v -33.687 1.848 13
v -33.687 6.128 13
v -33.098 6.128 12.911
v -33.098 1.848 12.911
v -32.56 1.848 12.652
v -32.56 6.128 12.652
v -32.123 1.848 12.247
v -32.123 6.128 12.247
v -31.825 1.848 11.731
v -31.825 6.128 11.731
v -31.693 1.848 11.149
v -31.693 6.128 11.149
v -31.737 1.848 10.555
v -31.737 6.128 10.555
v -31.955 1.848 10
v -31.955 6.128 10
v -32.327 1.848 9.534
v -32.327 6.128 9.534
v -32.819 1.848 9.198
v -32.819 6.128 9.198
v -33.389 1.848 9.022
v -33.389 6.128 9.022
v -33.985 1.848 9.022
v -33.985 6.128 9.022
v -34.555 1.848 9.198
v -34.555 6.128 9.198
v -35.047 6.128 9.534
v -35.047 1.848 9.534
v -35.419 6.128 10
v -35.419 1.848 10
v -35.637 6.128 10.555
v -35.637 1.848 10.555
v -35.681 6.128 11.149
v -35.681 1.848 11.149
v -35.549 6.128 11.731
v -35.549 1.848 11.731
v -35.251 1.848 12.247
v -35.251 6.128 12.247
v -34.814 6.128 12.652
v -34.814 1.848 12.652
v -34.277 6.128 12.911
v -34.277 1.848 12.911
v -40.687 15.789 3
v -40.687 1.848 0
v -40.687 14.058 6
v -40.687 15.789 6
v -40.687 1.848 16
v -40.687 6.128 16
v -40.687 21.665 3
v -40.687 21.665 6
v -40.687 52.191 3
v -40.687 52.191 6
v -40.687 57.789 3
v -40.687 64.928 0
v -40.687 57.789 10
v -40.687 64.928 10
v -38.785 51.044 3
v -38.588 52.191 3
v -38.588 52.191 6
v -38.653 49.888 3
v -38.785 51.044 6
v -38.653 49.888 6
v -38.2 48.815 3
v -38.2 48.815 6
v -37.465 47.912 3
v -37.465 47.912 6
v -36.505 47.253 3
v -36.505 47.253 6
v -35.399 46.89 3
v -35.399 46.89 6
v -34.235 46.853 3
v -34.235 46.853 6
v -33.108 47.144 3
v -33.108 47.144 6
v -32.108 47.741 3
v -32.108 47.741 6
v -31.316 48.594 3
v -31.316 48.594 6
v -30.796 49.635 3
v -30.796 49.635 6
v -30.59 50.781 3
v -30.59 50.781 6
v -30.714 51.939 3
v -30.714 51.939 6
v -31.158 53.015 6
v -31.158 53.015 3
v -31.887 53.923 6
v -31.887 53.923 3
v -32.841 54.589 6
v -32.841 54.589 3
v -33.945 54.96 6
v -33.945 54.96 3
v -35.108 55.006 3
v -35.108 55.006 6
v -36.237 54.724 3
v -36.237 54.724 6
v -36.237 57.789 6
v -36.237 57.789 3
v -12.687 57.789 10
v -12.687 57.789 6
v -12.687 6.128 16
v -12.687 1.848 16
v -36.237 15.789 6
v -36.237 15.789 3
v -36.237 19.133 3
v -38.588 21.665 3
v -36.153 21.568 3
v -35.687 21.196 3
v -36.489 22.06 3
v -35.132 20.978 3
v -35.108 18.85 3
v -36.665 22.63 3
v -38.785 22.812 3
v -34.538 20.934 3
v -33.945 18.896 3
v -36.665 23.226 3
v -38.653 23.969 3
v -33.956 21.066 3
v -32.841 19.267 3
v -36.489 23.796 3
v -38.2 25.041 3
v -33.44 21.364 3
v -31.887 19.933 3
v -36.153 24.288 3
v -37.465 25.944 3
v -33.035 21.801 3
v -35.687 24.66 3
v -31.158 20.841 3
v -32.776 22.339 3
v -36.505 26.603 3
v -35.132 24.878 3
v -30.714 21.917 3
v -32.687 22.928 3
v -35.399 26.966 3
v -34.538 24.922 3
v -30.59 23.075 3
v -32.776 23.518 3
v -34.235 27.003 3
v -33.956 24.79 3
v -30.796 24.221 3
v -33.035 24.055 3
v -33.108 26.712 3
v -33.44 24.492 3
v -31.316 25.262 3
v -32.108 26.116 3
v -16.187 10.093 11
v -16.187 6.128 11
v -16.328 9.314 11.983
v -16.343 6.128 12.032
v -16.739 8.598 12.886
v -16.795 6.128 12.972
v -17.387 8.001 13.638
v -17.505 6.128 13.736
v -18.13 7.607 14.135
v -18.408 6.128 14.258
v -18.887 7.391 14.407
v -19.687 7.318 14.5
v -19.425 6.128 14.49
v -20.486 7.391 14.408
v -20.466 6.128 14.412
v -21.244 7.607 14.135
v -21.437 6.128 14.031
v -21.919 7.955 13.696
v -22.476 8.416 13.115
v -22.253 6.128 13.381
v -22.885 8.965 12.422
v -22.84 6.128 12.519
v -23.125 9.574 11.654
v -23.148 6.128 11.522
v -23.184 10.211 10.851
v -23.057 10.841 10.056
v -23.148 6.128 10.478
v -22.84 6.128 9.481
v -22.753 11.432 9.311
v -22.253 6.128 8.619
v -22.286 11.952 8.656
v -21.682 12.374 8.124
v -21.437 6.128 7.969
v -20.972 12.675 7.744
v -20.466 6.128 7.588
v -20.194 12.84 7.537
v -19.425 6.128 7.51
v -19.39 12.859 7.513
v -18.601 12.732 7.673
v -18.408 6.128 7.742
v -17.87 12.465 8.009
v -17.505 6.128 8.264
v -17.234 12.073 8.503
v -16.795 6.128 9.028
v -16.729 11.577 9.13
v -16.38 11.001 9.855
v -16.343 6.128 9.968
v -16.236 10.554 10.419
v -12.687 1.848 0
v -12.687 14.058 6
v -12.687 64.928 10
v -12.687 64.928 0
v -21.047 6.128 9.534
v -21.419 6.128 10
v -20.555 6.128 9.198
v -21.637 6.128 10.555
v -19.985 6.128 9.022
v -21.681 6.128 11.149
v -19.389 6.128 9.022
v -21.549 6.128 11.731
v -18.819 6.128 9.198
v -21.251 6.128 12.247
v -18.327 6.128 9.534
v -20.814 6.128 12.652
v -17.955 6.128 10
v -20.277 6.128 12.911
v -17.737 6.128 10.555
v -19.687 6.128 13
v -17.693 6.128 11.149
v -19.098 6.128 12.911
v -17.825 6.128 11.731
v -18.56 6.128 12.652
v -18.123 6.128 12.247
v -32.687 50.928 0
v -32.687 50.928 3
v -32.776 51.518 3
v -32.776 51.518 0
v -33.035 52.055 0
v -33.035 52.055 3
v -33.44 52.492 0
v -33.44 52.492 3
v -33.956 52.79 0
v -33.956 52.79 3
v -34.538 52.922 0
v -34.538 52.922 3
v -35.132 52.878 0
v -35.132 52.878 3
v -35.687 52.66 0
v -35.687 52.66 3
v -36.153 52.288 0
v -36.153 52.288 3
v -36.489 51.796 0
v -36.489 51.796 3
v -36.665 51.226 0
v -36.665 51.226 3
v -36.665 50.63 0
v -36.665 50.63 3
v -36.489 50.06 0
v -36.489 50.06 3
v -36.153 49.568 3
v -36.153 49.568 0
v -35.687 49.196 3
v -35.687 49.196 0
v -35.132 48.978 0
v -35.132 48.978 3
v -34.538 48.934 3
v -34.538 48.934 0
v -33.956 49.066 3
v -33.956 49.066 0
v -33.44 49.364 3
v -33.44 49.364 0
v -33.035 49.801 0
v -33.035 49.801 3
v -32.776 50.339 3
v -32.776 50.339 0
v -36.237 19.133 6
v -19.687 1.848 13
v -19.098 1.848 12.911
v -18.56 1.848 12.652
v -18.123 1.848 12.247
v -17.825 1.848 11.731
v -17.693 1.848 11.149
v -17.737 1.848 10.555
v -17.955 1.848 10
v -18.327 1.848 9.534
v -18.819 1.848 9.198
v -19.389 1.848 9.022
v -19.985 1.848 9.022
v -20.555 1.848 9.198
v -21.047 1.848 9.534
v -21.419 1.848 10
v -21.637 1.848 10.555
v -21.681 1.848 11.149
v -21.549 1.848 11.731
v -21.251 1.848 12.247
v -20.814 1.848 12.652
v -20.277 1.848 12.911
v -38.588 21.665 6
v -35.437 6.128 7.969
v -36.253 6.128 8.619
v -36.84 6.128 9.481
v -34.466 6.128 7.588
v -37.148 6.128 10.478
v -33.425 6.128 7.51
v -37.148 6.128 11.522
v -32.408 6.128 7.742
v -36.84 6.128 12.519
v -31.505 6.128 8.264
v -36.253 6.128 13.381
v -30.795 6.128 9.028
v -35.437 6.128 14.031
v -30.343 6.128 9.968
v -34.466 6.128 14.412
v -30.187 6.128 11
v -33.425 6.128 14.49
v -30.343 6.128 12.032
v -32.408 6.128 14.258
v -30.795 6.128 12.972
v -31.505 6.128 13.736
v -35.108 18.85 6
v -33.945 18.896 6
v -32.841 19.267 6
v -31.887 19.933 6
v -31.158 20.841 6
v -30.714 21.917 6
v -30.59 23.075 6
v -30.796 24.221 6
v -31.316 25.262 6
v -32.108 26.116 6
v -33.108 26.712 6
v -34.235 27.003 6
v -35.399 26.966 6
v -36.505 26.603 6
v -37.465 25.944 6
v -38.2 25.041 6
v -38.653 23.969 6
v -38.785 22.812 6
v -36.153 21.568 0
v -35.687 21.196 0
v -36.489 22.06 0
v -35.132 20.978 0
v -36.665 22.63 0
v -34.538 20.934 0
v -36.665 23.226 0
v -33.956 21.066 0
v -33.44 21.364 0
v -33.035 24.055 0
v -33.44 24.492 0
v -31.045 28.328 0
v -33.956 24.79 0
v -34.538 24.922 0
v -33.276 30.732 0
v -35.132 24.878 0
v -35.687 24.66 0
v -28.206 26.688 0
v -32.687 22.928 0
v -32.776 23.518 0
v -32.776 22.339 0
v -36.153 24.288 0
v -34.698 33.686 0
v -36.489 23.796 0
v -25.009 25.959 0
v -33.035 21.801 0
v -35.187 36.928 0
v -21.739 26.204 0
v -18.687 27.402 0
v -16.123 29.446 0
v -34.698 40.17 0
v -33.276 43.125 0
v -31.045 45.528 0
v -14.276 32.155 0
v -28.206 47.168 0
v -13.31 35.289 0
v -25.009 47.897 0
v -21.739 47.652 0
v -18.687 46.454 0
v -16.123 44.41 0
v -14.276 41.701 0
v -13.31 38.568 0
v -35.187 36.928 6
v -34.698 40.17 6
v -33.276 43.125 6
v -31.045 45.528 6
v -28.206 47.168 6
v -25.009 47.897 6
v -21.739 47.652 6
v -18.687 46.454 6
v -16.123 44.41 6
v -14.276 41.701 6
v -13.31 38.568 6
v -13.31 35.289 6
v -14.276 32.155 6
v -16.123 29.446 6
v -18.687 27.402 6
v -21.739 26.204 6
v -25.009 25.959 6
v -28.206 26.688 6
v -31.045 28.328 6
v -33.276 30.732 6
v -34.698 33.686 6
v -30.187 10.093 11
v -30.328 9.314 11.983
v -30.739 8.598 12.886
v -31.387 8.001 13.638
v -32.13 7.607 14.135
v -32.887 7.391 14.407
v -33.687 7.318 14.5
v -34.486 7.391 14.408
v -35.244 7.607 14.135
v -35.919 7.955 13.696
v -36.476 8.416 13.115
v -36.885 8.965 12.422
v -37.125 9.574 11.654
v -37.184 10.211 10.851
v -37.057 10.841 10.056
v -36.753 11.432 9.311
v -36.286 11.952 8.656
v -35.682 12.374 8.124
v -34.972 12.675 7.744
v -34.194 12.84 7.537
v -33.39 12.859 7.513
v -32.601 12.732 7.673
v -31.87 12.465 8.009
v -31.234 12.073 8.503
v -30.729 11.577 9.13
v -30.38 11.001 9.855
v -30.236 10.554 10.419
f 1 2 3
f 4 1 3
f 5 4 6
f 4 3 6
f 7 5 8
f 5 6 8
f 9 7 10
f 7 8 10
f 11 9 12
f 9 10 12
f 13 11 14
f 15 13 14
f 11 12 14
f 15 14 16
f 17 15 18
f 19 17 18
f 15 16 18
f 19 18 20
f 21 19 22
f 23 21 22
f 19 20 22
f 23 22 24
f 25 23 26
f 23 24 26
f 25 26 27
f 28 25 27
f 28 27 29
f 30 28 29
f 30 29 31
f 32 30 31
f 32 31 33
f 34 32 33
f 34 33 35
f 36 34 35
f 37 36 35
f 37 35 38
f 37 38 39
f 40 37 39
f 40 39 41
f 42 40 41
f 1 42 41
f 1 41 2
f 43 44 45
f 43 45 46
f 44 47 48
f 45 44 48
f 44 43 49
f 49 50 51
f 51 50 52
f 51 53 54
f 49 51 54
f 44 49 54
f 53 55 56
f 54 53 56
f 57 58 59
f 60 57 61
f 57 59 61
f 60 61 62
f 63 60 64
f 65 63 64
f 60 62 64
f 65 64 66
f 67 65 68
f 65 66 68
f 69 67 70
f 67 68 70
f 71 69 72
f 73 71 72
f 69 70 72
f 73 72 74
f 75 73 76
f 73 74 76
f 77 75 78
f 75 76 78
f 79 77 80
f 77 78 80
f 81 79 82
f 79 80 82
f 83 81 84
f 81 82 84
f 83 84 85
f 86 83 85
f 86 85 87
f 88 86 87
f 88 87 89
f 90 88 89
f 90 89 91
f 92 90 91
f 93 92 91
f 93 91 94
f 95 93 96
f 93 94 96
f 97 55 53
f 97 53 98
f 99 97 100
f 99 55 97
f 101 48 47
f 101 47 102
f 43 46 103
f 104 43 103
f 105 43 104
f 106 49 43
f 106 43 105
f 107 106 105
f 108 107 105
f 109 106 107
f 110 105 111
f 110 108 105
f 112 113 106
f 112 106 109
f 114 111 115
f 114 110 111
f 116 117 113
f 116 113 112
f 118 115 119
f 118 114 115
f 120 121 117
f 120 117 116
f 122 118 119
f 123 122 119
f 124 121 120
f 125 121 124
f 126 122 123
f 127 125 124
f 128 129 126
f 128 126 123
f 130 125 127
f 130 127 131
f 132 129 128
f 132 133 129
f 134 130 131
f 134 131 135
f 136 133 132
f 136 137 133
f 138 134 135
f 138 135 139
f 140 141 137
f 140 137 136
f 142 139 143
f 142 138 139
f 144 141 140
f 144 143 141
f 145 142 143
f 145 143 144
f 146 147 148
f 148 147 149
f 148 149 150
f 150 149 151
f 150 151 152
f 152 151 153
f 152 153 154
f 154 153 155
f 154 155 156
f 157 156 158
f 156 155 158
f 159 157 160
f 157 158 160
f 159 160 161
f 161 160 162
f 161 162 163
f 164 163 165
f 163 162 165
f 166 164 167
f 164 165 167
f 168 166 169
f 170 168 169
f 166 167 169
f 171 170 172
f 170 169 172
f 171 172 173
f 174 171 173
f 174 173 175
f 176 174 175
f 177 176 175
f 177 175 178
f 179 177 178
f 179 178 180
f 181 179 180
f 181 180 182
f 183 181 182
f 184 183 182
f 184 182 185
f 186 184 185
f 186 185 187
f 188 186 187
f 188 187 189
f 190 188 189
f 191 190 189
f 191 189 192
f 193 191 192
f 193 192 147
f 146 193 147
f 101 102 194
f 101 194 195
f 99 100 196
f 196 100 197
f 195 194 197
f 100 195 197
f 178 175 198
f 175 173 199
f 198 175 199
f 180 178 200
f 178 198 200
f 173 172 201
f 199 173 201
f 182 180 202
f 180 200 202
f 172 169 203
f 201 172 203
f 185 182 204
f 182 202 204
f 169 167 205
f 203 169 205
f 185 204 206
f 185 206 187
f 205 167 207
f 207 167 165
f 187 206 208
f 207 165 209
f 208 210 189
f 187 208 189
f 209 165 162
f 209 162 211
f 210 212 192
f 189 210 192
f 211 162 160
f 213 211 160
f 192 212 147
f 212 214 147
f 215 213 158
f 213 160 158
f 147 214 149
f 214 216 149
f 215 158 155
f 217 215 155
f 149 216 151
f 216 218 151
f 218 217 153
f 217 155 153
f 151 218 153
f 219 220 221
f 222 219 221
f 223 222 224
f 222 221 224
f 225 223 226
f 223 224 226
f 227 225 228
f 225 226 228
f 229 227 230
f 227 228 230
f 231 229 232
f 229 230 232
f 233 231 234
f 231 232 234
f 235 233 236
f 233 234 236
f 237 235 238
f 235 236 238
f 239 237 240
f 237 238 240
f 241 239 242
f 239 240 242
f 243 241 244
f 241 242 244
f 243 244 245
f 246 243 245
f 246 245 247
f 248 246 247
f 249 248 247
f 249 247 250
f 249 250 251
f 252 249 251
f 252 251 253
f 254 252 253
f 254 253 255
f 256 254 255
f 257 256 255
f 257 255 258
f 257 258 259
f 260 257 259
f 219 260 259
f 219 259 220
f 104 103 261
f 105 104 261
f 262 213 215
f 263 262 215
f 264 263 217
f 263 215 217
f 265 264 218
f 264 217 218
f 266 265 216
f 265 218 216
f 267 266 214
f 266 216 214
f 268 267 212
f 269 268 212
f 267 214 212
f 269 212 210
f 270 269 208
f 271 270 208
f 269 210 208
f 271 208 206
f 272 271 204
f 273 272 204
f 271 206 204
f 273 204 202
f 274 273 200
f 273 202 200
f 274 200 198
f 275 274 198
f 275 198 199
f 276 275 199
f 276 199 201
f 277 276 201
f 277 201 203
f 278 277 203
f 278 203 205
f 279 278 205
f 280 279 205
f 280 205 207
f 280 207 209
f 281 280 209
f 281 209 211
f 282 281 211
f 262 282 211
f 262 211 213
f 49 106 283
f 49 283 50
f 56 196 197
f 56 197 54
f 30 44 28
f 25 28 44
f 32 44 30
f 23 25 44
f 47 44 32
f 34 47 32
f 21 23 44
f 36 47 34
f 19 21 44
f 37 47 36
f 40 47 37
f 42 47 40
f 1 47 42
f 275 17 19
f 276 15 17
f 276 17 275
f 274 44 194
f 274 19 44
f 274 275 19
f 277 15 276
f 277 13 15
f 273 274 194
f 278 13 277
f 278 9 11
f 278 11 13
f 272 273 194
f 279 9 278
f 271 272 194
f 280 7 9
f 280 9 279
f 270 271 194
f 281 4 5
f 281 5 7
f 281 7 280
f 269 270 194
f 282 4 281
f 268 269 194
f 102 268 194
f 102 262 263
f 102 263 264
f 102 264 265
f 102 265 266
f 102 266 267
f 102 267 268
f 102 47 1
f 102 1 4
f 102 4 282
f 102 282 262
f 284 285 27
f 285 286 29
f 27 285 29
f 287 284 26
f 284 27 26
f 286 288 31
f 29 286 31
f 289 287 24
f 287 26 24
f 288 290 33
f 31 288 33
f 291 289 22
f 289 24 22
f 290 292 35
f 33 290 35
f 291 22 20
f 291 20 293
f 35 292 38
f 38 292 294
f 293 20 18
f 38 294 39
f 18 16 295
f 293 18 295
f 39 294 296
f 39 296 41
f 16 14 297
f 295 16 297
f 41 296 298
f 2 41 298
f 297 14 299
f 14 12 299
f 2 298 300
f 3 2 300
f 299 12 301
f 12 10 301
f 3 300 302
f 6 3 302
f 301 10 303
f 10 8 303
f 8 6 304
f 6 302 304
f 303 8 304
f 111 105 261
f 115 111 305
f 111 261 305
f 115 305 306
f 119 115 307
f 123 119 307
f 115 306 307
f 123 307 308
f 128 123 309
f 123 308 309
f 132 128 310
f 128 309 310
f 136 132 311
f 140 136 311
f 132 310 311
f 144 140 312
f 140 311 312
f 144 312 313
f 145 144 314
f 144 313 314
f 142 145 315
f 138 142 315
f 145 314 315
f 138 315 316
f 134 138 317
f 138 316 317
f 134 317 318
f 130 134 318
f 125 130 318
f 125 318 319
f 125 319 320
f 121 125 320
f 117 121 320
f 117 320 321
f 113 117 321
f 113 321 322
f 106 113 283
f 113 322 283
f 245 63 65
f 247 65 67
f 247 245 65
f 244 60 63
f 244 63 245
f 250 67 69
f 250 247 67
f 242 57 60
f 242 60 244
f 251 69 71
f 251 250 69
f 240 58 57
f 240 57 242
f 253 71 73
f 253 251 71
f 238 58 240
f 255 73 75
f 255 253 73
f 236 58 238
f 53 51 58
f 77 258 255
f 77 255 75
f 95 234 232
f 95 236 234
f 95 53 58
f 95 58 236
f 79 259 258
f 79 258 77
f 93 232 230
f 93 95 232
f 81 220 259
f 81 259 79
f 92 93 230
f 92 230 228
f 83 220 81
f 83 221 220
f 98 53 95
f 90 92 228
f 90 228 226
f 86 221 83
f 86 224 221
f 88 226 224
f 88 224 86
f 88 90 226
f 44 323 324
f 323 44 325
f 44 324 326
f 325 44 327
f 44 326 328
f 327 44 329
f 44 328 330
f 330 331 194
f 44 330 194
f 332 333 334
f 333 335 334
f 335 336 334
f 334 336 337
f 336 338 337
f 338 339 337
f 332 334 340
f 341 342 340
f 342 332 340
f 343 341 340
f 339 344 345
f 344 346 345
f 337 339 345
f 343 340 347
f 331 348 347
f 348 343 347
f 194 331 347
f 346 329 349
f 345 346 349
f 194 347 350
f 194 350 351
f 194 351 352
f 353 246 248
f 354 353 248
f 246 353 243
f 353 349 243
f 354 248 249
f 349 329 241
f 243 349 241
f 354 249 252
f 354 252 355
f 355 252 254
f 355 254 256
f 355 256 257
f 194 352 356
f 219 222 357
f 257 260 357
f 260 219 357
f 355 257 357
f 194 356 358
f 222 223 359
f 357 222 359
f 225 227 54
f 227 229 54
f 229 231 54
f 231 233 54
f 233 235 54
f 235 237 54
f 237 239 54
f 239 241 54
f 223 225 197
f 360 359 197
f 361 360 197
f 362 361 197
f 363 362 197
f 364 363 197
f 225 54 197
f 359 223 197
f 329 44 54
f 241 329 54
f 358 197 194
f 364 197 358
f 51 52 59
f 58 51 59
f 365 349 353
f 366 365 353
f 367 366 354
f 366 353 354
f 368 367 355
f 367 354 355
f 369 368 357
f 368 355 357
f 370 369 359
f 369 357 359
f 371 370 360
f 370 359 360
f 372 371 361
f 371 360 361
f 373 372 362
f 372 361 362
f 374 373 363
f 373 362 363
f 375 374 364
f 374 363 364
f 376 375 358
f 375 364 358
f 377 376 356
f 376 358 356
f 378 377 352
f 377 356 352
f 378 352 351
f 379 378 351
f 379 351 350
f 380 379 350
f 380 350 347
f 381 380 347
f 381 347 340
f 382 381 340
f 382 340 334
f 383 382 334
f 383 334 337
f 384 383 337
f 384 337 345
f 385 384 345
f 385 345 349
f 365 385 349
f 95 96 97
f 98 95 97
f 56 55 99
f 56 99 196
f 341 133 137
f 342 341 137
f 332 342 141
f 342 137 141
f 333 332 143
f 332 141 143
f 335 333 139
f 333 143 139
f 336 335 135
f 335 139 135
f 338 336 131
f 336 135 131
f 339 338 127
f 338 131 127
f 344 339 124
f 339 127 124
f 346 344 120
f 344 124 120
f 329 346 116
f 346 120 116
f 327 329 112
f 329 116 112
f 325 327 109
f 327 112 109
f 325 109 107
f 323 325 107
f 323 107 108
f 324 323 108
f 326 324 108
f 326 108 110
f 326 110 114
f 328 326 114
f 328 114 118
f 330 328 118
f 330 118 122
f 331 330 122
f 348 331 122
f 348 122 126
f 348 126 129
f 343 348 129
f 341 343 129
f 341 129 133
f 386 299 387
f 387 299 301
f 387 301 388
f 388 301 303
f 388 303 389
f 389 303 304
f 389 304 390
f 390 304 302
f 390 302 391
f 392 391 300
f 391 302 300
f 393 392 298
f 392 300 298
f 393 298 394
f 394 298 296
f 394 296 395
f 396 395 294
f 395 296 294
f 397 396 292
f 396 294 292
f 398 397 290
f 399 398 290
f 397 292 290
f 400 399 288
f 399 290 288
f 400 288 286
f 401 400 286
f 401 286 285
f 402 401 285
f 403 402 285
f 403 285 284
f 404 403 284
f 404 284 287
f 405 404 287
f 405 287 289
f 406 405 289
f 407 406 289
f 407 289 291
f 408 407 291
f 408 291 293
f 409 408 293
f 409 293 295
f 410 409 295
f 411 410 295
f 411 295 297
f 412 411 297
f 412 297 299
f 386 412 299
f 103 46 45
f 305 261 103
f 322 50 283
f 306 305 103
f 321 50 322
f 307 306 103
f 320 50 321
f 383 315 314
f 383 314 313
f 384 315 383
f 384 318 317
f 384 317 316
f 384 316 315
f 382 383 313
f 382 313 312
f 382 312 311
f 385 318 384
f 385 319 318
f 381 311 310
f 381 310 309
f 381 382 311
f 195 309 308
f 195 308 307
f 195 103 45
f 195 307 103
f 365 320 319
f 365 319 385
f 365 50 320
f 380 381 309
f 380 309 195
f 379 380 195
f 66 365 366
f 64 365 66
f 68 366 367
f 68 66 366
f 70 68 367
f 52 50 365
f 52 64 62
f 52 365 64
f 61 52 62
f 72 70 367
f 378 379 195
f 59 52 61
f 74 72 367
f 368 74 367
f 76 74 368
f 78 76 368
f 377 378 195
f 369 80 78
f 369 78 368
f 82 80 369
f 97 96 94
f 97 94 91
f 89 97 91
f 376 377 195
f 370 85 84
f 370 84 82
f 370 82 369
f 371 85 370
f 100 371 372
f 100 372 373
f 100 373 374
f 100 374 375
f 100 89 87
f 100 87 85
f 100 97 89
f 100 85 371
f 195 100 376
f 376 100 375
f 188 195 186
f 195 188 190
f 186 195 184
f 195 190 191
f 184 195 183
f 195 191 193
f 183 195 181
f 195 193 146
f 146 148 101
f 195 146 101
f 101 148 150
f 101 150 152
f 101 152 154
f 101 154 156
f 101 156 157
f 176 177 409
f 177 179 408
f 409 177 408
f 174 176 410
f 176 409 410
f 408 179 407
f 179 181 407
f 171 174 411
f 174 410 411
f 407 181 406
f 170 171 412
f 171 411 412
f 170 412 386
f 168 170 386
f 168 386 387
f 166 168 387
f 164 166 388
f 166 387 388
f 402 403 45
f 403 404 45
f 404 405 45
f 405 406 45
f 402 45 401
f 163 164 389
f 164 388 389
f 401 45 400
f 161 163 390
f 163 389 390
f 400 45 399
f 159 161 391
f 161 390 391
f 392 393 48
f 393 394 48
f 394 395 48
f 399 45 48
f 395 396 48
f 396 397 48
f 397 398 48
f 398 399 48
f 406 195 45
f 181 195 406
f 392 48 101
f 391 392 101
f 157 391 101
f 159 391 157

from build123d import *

# Parameters (mm, degrees)
SKETCH1_W            = 93
SKETCH1_H            = 100
BOSS_EXTRUDE2_DEPTH  = 10
SKETCH4_W            = 10.01
SKETCH4_H            = 15
BOSS_EXTRUDE4_DEPTH  = 24
SKETCH5_R            = 2
CUT_EXTRUDE1_DEPTH   = 50
SKETCH7_R            = 11
CUT_EXTRUDE3_DEPTH   = 50
SKETCH14_W           = 61.5
SKETCH14_H           = 42
CUT_EXTRUDE8_DEPTH   = 4
SKETCH19_R           = 11
CUT_EXTRUDE11_DEPTH  = 15
SKETCH20_R           = 2
CUT_EXTRUDE12_DEPTH  = 10
SKETCH21_W           = 40
SKETCH21_H           = 6
BOSS_EXTRUDE5_DEPTH  = 27
SKETCH22_W           = 40
SKETCH22_H           = 6.3
BOSS_EXTRUDE7_DEPTH  = 40
SKETCH23_R           = 8
CUT_EXTRUDE13_DEPTH  = 40
SKETCH24_W           = 118.277817783
SKETCH24_H           = 41.8
CUT_EXTRUDE14_DEPTH  = 40
SKETCH25_W           = 31.5
SKETCH25_H           = 23.2
CUT_EXTRUDE15_DEPTH  = 20
CUT_EXTRUDE18_DEPTH  = 3
SKETCH27_R           = 4.1
SKETCH27_R_2         = 4
CUT_EXTRUDE29_DEPTH  = 3
SKETCH28_W           = 29.5
SKETCH28_H           = 58.2
CUT_EXTRUDE30_DEPTH  = 23
SKETCH29_W           = 32
SKETCH29_H           = 4
CUT_EXTRUDE31_DEPTH  = 23
SKETCH31_W           = 32
SKETCH31_H           = 6
BOSS_EXTRUDE9_DEPTH  = 6.6
SKETCH32_W           = 32
SKETCH32_H           = 6
BOSS_EXTRUDE10_DEPTH = 10
SKETCH33_R           = 2
CUT_EXTRUDE32_DEPTH  = 10
BOSS_EXTRUDE11_START = -32
BOSS_EXTRUDE11_DEPTH = 32
SKETCH35_R           = 3.5
CUT_EXTRUDE33_DEPTH  = 10
SKETCH36_W           = 27
SKETCH36_H           = 46
CUT_EXTRUDE34_DEPTH  = 50
SKETCH38_W           = 31.75
SKETCH38_H           = 35
CUT_EXTRUDE35_DEPTH  = 50
SKETCH40_W           = 4
SKETCH40_H           = 77.818306413
CUT_EXTRUDE37_DEPTH  = 110
SKETCH41_W           = 28
SKETCH41_H           = 1.72
CUT_EXTRUDE38_DEPTH  = 50


with BuildPart() as part:
    # Sketch1 → Boss-Extrude2 (new body)
    with BuildSketch(Plane.XY):
        with Locations((-29.68705036, 14.928057554)):
            Rectangle(SKETCH1_W, SKETCH1_H)
    extrude(amount=BOSS_EXTRUDE2_DEPTH)

    # Sketch4 → Boss-Extrude4 (add)
    with BuildSketch(Plane(origin=(16.81294964, 0, 0), x_dir=(0, 0, -1), z_dir=(1, 0, 0))):
        with Locations((-4.995, -12.571942446)):
            Rectangle(SKETCH4_W, SKETCH4_H)
    extrude(amount=BOSS_EXTRUDE4_DEPTH)

    # Sketch5 → Cut-Extrude1 (cut)
    with BuildSketch(Plane(origin=(0, -5.071942446, 0), x_dir=(1, 0, 0), z_dir=(0, 1, 0))):
        with Locations(Location((26.81294964, -5, 0), (0, 0, 180))):
            Circle(SKETCH5_R)
    extrude(amount=-CUT_EXTRUDE1_DEPTH, mode=Mode.SUBTRACT)

    # Sketch7 → Cut-Extrude3 (cut)
    with BuildSketch(Plane(origin=(0, 0, 0), x_dir=(-1, 0, 0), z_dir=(0, 0, -1))):
        with Locations((24.18705036, 36.928057554)):
            Circle(SKETCH7_R)
    extrude(amount=-CUT_EXTRUDE3_DEPTH, mode=Mode.SUBTRACT)

    # Sketch14 → Cut-Extrude8 (cut)
    with BuildSketch(Plane.XY.offset(10)):
        with Locations((-13.93705036, 36.789132279)):
            Rectangle(SKETCH14_W, SKETCH14_H)
    extrude(amount=-CUT_EXTRUDE8_DEPTH, mode=Mode.SUBTRACT)

    # Sketch19 → Cut-Extrude11 (cut)
    with BuildSketch(Plane(origin=(0, 0, 0), x_dir=(-1, 0, 0), z_dir=(0, 0, -1))):
        with Locations((53.18705036, 36.928057554)):
            Circle(SKETCH19_R)
    extrude(amount=-CUT_EXTRUDE11_DEPTH, mode=Mode.SUBTRACT)

    # Sketch20 → Cut-Extrude12 (cut)
    with BuildSketch(Plane.XY.offset(6)):
        with Locations((-34.68705036, 50.928057554)):
            Circle(SKETCH20_R)
        with Locations((5.31294964, 50.928057554)):
            Circle(SKETCH20_R)
        with Locations((-34.68705036, 22.928057554)):
            Circle(SKETCH20_R)
        with Locations((5.31294964, 22.928057554)):
            Circle(SKETCH20_R)
    extrude(amount=-CUT_EXTRUDE12_DEPTH, mode=Mode.SUBTRACT)

    # Sketch21 → Boss-Extrude5 (add)
    with BuildSketch(Plane(origin=(0, 0, 0), x_dir=(-1, 0, 0), z_dir=(0, 0, -1))):
        with Locations((56.18705036, 61.928057554)):
            Rectangle(SKETCH21_W, SKETCH21_H)
    extrude(amount=BOSS_EXTRUDE5_DEPTH)

    # Sketch22 → Boss-Extrude7 (add)
    with BuildSketch(Plane.XZ.offset(-58.928057554)):
        with Locations((-56.18705036, -23.85)):
            Rectangle(SKETCH22_W, SKETCH22_H)
    extrude(amount=BOSS_EXTRUDE7_DEPTH)

    # Sketch23 → Cut-Extrude13 (cut)
    with BuildSketch(Plane.XY.offset(10)):
        with Locations((-53.18705036, 36.928057554)):
            Circle(SKETCH23_R)
    extrude(amount=-CUT_EXTRUDE13_DEPTH, mode=Mode.SUBTRACT)

    # Sketch24 → Cut-Extrude14 (cut)
    with BuildSketch(Plane.XY.offset(10)):
        with Locations((-17.048141468, -14.171942446)):
            Rectangle(SKETCH24_W, SKETCH24_H)
    extrude(amount=-CUT_EXTRUDE14_DEPTH, mode=Mode.SUBTRACT)

    # Sketch25 → Cut-Extrude15 (cut)
    with BuildSketch(Plane.XY.offset(10)):
        with Locations((-60.43705036, 18.328057554)):
            Rectangle(SKETCH25_W, SKETCH25_H)
    extrude(amount=-CUT_EXTRUDE15_DEPTH, mode=Mode.SUBTRACT)

    # Sketch26 → Cut-Extrude18 (cut)
    with BuildSketch(Plane.XY.offset(6)):
        with BuildLine():
            Line((14.30212304, 57.789132279), (6.863398886, 57.789132279))
            Line((6.863398886, 57.789132279), (6.863398886, 54.615347499))
            ThreePointArc((6.863398886, 54.615347499), (8.24773413, 53.645968516), (9.108195728, 52.191428892))
            Line((9.108195728, 52.191428892), (14.30212304, 52.191428892))
            Line((14.30212304, 52.191428892), (14.30212304, 57.789132279))
        make_face()
        with BuildLine():
            Line((6.863398886, 19.240767609), (6.863398886, 15.789132279))
            Line((6.863398886, 15.789132279), (14.30212304, 15.789132279))
            Line((14.30212304, 15.789132279), (14.30212304, 20.928057554))
            Line((14.30212304, 20.928057554), (8.777051255, 20.928057554))
            ThreePointArc((8.777051255, 20.928057554), (7.95835451, 19.927752057), (6.863398886, 19.240767609))
        make_face()
        with BuildLine():
            Line((-36.237499605, 57.789132279), (-44.68705036, 57.789132279))
            Line((-44.68705036, 57.789132279), (-44.68705036, 52.191428892))
            Line((-44.68705036, 52.191428892), (-38.482296447, 52.191428892))
            ThreePointArc((-38.482296447, 52.191428892), (-37.621834849, 53.645968516), (-36.237499605, 54.615347499))
            Line((-36.237499605, 54.615347499), (-36.237499605, 57.789132279))
        make_face()
        with BuildLine():
            Line((-44.68705036, 21.664686216), (-44.68705036, 15.789132279))
            Line((-44.68705036, 15.789132279), (-36.237499605, 15.789132279))
            Line((-36.237499605, 15.789132279), (-36.237499605, 19.240767609))
            ThreePointArc((-36.237499605, 19.240767609), (-37.621834849, 20.210146592), (-38.482296447, 21.664686216))
            Line((-38.482296447, 21.664686216), (-44.68705036, 21.664686216))
        make_face()
    extrude(amount=-CUT_EXTRUDE18_DEPTH, mode=Mode.SUBTRACT)

    # Sketch27 → Cut-Extrude29 (cut)
    with BuildSketch(Plane.XY.offset(6)):
        with Locations((5.31294964, 50.928057554)):
            Circle(SKETCH27_R)
        with Locations((5.31294964, 22.928057554)):
            Circle(SKETCH27_R_2)
        with Locations((-34.68705036, 50.928057554)):
            Circle(SKETCH27_R)
        with Locations((-34.68705036, 22.928057554)):
            Circle(SKETCH27_R)
    extrude(amount=-CUT_EXTRUDE29_DEPTH, mode=Mode.SUBTRACT)

    # Sketch28 → Cut-Extrude30 (cut)
    with BuildSketch(Plane(origin=(0, 0, 0), x_dir=(-1, 0, 0), z_dir=(0, 0, -1))):
        with Locations((-2.06294964, 35.828057554)):
            Rectangle(SKETCH28_W, SKETCH28_H)
    extrude(amount=-CUT_EXTRUDE30_DEPTH, mode=Mode.SUBTRACT)

    # Sketch29 → Cut-Extrude31 (cut)
    with BuildSketch(Plane(origin=(0, 15.789132279, 0), x_dir=(1, 0, 0), z_dir=(0, 1, 0))):
        with Locations((-28.68705036, -8)):
            Rectangle(SKETCH29_W, SKETCH29_H)
    extrude(amount=-CUT_EXTRUDE31_DEPTH, mode=Mode.SUBTRACT)

    # Sketch31 → Boss-Extrude9 (add)
    with BuildSketch(Plane.XZ.offset(-6.728057554)):
        with Locations((-28.68705036, 3)):
            Rectangle(SKETCH31_W, SKETCH31_H)
    extrude(amount=BOSS_EXTRUDE9_DEPTH)

    # Sketch32 → Boss-Extrude10 (add)
    with BuildSketch(Plane.XY.offset(6)):
        with Locations((-28.68705036, 3.128057554)):
            Rectangle(SKETCH32_W, SKETCH32_H)
    extrude(amount=BOSS_EXTRUDE10_DEPTH)

    # Sketch33 → Cut-Extrude32 (cut)
    with BuildSketch(Plane(origin=(0, 6.128057554, 0), x_dir=(1, 0, 0), z_dir=(0, 1, 0))):
        with Locations(Location((-33.68705036, -11, 0), (0, 0, 270))):
            Circle(SKETCH33_R)
        with Locations(Location((-19.68705036, -11, 0), (0, 0, 270))):
            Circle(SKETCH33_R)
    extrude(amount=-CUT_EXTRUDE32_DEPTH, mode=Mode.SUBTRACT)

    # Sketch34 → Boss-Extrude11 (add)
    with BuildSketch(Plane(origin=(-12.68705036, 0, 0), x_dir=(0, 0, -1), z_dir=(1, 0, 0)).offset(BOSS_EXTRUDE11_START)):
        Polygon((-16, 6.128057554), (-6, 6.128057554), (-6, 14.058360342), align=None)
    extrude(amount=BOSS_EXTRUDE11_DEPTH)

    # Sketch35 → Cut-Extrude33 (cut)
    with BuildSketch(Plane.XZ.offset(-6.128057554)):
        with Locations((-19.68705036, 11)):
            Circle(SKETCH35_R)
        with Locations((-33.68705036, 11)):
            Circle(SKETCH35_R)
    extrude(amount=-CUT_EXTRUDE33_DEPTH, mode=Mode.SUBTRACT)

    # Sketch36 → Cut-Extrude34 (cut)
    with BuildSketch(Plane(origin=(-36.18705036, 0, 0), x_dir=(0, 0, -1), z_dir=(1, 0, 0))):
        with Locations((13.5, 41.928057554)):
            Rectangle(SKETCH36_W, SKETCH36_H)
    extrude(amount=-CUT_EXTRUDE34_DEPTH, mode=Mode.SUBTRACT)

    # Sketch38 → Cut-Extrude35 (cut)
    with BuildSketch(Plane.XY.offset(10)):
        with Locations((-60.31205036, 47.428057554)):
            Rectangle(SKETCH38_W, SKETCH38_H)
    extrude(amount=-CUT_EXTRUDE35_DEPTH, mode=Mode.SUBTRACT)

    # Sketch40 → Cut-Extrude37 (cut)
    with BuildSketch(Plane.XY.offset(16)):
        with Locations((-42.68705036, 39.037210761)):
            Rectangle(SKETCH40_W, SKETCH40_H)
    extrude(amount=-CUT_EXTRUDE37_DEPTH, mode=Mode.SUBTRACT)

    # Sketch41 → Cut-Extrude38 (cut)
    with BuildSketch(Plane.XY.offset(16)):
        with Locations((-26.68705036, 0.988057554)):
            Rectangle(SKETCH41_W, SKETCH41_H)
    extrude(amount=-CUT_EXTRUDE38_DEPTH, mode=Mode.SUBTRACT)


solid = part.part
